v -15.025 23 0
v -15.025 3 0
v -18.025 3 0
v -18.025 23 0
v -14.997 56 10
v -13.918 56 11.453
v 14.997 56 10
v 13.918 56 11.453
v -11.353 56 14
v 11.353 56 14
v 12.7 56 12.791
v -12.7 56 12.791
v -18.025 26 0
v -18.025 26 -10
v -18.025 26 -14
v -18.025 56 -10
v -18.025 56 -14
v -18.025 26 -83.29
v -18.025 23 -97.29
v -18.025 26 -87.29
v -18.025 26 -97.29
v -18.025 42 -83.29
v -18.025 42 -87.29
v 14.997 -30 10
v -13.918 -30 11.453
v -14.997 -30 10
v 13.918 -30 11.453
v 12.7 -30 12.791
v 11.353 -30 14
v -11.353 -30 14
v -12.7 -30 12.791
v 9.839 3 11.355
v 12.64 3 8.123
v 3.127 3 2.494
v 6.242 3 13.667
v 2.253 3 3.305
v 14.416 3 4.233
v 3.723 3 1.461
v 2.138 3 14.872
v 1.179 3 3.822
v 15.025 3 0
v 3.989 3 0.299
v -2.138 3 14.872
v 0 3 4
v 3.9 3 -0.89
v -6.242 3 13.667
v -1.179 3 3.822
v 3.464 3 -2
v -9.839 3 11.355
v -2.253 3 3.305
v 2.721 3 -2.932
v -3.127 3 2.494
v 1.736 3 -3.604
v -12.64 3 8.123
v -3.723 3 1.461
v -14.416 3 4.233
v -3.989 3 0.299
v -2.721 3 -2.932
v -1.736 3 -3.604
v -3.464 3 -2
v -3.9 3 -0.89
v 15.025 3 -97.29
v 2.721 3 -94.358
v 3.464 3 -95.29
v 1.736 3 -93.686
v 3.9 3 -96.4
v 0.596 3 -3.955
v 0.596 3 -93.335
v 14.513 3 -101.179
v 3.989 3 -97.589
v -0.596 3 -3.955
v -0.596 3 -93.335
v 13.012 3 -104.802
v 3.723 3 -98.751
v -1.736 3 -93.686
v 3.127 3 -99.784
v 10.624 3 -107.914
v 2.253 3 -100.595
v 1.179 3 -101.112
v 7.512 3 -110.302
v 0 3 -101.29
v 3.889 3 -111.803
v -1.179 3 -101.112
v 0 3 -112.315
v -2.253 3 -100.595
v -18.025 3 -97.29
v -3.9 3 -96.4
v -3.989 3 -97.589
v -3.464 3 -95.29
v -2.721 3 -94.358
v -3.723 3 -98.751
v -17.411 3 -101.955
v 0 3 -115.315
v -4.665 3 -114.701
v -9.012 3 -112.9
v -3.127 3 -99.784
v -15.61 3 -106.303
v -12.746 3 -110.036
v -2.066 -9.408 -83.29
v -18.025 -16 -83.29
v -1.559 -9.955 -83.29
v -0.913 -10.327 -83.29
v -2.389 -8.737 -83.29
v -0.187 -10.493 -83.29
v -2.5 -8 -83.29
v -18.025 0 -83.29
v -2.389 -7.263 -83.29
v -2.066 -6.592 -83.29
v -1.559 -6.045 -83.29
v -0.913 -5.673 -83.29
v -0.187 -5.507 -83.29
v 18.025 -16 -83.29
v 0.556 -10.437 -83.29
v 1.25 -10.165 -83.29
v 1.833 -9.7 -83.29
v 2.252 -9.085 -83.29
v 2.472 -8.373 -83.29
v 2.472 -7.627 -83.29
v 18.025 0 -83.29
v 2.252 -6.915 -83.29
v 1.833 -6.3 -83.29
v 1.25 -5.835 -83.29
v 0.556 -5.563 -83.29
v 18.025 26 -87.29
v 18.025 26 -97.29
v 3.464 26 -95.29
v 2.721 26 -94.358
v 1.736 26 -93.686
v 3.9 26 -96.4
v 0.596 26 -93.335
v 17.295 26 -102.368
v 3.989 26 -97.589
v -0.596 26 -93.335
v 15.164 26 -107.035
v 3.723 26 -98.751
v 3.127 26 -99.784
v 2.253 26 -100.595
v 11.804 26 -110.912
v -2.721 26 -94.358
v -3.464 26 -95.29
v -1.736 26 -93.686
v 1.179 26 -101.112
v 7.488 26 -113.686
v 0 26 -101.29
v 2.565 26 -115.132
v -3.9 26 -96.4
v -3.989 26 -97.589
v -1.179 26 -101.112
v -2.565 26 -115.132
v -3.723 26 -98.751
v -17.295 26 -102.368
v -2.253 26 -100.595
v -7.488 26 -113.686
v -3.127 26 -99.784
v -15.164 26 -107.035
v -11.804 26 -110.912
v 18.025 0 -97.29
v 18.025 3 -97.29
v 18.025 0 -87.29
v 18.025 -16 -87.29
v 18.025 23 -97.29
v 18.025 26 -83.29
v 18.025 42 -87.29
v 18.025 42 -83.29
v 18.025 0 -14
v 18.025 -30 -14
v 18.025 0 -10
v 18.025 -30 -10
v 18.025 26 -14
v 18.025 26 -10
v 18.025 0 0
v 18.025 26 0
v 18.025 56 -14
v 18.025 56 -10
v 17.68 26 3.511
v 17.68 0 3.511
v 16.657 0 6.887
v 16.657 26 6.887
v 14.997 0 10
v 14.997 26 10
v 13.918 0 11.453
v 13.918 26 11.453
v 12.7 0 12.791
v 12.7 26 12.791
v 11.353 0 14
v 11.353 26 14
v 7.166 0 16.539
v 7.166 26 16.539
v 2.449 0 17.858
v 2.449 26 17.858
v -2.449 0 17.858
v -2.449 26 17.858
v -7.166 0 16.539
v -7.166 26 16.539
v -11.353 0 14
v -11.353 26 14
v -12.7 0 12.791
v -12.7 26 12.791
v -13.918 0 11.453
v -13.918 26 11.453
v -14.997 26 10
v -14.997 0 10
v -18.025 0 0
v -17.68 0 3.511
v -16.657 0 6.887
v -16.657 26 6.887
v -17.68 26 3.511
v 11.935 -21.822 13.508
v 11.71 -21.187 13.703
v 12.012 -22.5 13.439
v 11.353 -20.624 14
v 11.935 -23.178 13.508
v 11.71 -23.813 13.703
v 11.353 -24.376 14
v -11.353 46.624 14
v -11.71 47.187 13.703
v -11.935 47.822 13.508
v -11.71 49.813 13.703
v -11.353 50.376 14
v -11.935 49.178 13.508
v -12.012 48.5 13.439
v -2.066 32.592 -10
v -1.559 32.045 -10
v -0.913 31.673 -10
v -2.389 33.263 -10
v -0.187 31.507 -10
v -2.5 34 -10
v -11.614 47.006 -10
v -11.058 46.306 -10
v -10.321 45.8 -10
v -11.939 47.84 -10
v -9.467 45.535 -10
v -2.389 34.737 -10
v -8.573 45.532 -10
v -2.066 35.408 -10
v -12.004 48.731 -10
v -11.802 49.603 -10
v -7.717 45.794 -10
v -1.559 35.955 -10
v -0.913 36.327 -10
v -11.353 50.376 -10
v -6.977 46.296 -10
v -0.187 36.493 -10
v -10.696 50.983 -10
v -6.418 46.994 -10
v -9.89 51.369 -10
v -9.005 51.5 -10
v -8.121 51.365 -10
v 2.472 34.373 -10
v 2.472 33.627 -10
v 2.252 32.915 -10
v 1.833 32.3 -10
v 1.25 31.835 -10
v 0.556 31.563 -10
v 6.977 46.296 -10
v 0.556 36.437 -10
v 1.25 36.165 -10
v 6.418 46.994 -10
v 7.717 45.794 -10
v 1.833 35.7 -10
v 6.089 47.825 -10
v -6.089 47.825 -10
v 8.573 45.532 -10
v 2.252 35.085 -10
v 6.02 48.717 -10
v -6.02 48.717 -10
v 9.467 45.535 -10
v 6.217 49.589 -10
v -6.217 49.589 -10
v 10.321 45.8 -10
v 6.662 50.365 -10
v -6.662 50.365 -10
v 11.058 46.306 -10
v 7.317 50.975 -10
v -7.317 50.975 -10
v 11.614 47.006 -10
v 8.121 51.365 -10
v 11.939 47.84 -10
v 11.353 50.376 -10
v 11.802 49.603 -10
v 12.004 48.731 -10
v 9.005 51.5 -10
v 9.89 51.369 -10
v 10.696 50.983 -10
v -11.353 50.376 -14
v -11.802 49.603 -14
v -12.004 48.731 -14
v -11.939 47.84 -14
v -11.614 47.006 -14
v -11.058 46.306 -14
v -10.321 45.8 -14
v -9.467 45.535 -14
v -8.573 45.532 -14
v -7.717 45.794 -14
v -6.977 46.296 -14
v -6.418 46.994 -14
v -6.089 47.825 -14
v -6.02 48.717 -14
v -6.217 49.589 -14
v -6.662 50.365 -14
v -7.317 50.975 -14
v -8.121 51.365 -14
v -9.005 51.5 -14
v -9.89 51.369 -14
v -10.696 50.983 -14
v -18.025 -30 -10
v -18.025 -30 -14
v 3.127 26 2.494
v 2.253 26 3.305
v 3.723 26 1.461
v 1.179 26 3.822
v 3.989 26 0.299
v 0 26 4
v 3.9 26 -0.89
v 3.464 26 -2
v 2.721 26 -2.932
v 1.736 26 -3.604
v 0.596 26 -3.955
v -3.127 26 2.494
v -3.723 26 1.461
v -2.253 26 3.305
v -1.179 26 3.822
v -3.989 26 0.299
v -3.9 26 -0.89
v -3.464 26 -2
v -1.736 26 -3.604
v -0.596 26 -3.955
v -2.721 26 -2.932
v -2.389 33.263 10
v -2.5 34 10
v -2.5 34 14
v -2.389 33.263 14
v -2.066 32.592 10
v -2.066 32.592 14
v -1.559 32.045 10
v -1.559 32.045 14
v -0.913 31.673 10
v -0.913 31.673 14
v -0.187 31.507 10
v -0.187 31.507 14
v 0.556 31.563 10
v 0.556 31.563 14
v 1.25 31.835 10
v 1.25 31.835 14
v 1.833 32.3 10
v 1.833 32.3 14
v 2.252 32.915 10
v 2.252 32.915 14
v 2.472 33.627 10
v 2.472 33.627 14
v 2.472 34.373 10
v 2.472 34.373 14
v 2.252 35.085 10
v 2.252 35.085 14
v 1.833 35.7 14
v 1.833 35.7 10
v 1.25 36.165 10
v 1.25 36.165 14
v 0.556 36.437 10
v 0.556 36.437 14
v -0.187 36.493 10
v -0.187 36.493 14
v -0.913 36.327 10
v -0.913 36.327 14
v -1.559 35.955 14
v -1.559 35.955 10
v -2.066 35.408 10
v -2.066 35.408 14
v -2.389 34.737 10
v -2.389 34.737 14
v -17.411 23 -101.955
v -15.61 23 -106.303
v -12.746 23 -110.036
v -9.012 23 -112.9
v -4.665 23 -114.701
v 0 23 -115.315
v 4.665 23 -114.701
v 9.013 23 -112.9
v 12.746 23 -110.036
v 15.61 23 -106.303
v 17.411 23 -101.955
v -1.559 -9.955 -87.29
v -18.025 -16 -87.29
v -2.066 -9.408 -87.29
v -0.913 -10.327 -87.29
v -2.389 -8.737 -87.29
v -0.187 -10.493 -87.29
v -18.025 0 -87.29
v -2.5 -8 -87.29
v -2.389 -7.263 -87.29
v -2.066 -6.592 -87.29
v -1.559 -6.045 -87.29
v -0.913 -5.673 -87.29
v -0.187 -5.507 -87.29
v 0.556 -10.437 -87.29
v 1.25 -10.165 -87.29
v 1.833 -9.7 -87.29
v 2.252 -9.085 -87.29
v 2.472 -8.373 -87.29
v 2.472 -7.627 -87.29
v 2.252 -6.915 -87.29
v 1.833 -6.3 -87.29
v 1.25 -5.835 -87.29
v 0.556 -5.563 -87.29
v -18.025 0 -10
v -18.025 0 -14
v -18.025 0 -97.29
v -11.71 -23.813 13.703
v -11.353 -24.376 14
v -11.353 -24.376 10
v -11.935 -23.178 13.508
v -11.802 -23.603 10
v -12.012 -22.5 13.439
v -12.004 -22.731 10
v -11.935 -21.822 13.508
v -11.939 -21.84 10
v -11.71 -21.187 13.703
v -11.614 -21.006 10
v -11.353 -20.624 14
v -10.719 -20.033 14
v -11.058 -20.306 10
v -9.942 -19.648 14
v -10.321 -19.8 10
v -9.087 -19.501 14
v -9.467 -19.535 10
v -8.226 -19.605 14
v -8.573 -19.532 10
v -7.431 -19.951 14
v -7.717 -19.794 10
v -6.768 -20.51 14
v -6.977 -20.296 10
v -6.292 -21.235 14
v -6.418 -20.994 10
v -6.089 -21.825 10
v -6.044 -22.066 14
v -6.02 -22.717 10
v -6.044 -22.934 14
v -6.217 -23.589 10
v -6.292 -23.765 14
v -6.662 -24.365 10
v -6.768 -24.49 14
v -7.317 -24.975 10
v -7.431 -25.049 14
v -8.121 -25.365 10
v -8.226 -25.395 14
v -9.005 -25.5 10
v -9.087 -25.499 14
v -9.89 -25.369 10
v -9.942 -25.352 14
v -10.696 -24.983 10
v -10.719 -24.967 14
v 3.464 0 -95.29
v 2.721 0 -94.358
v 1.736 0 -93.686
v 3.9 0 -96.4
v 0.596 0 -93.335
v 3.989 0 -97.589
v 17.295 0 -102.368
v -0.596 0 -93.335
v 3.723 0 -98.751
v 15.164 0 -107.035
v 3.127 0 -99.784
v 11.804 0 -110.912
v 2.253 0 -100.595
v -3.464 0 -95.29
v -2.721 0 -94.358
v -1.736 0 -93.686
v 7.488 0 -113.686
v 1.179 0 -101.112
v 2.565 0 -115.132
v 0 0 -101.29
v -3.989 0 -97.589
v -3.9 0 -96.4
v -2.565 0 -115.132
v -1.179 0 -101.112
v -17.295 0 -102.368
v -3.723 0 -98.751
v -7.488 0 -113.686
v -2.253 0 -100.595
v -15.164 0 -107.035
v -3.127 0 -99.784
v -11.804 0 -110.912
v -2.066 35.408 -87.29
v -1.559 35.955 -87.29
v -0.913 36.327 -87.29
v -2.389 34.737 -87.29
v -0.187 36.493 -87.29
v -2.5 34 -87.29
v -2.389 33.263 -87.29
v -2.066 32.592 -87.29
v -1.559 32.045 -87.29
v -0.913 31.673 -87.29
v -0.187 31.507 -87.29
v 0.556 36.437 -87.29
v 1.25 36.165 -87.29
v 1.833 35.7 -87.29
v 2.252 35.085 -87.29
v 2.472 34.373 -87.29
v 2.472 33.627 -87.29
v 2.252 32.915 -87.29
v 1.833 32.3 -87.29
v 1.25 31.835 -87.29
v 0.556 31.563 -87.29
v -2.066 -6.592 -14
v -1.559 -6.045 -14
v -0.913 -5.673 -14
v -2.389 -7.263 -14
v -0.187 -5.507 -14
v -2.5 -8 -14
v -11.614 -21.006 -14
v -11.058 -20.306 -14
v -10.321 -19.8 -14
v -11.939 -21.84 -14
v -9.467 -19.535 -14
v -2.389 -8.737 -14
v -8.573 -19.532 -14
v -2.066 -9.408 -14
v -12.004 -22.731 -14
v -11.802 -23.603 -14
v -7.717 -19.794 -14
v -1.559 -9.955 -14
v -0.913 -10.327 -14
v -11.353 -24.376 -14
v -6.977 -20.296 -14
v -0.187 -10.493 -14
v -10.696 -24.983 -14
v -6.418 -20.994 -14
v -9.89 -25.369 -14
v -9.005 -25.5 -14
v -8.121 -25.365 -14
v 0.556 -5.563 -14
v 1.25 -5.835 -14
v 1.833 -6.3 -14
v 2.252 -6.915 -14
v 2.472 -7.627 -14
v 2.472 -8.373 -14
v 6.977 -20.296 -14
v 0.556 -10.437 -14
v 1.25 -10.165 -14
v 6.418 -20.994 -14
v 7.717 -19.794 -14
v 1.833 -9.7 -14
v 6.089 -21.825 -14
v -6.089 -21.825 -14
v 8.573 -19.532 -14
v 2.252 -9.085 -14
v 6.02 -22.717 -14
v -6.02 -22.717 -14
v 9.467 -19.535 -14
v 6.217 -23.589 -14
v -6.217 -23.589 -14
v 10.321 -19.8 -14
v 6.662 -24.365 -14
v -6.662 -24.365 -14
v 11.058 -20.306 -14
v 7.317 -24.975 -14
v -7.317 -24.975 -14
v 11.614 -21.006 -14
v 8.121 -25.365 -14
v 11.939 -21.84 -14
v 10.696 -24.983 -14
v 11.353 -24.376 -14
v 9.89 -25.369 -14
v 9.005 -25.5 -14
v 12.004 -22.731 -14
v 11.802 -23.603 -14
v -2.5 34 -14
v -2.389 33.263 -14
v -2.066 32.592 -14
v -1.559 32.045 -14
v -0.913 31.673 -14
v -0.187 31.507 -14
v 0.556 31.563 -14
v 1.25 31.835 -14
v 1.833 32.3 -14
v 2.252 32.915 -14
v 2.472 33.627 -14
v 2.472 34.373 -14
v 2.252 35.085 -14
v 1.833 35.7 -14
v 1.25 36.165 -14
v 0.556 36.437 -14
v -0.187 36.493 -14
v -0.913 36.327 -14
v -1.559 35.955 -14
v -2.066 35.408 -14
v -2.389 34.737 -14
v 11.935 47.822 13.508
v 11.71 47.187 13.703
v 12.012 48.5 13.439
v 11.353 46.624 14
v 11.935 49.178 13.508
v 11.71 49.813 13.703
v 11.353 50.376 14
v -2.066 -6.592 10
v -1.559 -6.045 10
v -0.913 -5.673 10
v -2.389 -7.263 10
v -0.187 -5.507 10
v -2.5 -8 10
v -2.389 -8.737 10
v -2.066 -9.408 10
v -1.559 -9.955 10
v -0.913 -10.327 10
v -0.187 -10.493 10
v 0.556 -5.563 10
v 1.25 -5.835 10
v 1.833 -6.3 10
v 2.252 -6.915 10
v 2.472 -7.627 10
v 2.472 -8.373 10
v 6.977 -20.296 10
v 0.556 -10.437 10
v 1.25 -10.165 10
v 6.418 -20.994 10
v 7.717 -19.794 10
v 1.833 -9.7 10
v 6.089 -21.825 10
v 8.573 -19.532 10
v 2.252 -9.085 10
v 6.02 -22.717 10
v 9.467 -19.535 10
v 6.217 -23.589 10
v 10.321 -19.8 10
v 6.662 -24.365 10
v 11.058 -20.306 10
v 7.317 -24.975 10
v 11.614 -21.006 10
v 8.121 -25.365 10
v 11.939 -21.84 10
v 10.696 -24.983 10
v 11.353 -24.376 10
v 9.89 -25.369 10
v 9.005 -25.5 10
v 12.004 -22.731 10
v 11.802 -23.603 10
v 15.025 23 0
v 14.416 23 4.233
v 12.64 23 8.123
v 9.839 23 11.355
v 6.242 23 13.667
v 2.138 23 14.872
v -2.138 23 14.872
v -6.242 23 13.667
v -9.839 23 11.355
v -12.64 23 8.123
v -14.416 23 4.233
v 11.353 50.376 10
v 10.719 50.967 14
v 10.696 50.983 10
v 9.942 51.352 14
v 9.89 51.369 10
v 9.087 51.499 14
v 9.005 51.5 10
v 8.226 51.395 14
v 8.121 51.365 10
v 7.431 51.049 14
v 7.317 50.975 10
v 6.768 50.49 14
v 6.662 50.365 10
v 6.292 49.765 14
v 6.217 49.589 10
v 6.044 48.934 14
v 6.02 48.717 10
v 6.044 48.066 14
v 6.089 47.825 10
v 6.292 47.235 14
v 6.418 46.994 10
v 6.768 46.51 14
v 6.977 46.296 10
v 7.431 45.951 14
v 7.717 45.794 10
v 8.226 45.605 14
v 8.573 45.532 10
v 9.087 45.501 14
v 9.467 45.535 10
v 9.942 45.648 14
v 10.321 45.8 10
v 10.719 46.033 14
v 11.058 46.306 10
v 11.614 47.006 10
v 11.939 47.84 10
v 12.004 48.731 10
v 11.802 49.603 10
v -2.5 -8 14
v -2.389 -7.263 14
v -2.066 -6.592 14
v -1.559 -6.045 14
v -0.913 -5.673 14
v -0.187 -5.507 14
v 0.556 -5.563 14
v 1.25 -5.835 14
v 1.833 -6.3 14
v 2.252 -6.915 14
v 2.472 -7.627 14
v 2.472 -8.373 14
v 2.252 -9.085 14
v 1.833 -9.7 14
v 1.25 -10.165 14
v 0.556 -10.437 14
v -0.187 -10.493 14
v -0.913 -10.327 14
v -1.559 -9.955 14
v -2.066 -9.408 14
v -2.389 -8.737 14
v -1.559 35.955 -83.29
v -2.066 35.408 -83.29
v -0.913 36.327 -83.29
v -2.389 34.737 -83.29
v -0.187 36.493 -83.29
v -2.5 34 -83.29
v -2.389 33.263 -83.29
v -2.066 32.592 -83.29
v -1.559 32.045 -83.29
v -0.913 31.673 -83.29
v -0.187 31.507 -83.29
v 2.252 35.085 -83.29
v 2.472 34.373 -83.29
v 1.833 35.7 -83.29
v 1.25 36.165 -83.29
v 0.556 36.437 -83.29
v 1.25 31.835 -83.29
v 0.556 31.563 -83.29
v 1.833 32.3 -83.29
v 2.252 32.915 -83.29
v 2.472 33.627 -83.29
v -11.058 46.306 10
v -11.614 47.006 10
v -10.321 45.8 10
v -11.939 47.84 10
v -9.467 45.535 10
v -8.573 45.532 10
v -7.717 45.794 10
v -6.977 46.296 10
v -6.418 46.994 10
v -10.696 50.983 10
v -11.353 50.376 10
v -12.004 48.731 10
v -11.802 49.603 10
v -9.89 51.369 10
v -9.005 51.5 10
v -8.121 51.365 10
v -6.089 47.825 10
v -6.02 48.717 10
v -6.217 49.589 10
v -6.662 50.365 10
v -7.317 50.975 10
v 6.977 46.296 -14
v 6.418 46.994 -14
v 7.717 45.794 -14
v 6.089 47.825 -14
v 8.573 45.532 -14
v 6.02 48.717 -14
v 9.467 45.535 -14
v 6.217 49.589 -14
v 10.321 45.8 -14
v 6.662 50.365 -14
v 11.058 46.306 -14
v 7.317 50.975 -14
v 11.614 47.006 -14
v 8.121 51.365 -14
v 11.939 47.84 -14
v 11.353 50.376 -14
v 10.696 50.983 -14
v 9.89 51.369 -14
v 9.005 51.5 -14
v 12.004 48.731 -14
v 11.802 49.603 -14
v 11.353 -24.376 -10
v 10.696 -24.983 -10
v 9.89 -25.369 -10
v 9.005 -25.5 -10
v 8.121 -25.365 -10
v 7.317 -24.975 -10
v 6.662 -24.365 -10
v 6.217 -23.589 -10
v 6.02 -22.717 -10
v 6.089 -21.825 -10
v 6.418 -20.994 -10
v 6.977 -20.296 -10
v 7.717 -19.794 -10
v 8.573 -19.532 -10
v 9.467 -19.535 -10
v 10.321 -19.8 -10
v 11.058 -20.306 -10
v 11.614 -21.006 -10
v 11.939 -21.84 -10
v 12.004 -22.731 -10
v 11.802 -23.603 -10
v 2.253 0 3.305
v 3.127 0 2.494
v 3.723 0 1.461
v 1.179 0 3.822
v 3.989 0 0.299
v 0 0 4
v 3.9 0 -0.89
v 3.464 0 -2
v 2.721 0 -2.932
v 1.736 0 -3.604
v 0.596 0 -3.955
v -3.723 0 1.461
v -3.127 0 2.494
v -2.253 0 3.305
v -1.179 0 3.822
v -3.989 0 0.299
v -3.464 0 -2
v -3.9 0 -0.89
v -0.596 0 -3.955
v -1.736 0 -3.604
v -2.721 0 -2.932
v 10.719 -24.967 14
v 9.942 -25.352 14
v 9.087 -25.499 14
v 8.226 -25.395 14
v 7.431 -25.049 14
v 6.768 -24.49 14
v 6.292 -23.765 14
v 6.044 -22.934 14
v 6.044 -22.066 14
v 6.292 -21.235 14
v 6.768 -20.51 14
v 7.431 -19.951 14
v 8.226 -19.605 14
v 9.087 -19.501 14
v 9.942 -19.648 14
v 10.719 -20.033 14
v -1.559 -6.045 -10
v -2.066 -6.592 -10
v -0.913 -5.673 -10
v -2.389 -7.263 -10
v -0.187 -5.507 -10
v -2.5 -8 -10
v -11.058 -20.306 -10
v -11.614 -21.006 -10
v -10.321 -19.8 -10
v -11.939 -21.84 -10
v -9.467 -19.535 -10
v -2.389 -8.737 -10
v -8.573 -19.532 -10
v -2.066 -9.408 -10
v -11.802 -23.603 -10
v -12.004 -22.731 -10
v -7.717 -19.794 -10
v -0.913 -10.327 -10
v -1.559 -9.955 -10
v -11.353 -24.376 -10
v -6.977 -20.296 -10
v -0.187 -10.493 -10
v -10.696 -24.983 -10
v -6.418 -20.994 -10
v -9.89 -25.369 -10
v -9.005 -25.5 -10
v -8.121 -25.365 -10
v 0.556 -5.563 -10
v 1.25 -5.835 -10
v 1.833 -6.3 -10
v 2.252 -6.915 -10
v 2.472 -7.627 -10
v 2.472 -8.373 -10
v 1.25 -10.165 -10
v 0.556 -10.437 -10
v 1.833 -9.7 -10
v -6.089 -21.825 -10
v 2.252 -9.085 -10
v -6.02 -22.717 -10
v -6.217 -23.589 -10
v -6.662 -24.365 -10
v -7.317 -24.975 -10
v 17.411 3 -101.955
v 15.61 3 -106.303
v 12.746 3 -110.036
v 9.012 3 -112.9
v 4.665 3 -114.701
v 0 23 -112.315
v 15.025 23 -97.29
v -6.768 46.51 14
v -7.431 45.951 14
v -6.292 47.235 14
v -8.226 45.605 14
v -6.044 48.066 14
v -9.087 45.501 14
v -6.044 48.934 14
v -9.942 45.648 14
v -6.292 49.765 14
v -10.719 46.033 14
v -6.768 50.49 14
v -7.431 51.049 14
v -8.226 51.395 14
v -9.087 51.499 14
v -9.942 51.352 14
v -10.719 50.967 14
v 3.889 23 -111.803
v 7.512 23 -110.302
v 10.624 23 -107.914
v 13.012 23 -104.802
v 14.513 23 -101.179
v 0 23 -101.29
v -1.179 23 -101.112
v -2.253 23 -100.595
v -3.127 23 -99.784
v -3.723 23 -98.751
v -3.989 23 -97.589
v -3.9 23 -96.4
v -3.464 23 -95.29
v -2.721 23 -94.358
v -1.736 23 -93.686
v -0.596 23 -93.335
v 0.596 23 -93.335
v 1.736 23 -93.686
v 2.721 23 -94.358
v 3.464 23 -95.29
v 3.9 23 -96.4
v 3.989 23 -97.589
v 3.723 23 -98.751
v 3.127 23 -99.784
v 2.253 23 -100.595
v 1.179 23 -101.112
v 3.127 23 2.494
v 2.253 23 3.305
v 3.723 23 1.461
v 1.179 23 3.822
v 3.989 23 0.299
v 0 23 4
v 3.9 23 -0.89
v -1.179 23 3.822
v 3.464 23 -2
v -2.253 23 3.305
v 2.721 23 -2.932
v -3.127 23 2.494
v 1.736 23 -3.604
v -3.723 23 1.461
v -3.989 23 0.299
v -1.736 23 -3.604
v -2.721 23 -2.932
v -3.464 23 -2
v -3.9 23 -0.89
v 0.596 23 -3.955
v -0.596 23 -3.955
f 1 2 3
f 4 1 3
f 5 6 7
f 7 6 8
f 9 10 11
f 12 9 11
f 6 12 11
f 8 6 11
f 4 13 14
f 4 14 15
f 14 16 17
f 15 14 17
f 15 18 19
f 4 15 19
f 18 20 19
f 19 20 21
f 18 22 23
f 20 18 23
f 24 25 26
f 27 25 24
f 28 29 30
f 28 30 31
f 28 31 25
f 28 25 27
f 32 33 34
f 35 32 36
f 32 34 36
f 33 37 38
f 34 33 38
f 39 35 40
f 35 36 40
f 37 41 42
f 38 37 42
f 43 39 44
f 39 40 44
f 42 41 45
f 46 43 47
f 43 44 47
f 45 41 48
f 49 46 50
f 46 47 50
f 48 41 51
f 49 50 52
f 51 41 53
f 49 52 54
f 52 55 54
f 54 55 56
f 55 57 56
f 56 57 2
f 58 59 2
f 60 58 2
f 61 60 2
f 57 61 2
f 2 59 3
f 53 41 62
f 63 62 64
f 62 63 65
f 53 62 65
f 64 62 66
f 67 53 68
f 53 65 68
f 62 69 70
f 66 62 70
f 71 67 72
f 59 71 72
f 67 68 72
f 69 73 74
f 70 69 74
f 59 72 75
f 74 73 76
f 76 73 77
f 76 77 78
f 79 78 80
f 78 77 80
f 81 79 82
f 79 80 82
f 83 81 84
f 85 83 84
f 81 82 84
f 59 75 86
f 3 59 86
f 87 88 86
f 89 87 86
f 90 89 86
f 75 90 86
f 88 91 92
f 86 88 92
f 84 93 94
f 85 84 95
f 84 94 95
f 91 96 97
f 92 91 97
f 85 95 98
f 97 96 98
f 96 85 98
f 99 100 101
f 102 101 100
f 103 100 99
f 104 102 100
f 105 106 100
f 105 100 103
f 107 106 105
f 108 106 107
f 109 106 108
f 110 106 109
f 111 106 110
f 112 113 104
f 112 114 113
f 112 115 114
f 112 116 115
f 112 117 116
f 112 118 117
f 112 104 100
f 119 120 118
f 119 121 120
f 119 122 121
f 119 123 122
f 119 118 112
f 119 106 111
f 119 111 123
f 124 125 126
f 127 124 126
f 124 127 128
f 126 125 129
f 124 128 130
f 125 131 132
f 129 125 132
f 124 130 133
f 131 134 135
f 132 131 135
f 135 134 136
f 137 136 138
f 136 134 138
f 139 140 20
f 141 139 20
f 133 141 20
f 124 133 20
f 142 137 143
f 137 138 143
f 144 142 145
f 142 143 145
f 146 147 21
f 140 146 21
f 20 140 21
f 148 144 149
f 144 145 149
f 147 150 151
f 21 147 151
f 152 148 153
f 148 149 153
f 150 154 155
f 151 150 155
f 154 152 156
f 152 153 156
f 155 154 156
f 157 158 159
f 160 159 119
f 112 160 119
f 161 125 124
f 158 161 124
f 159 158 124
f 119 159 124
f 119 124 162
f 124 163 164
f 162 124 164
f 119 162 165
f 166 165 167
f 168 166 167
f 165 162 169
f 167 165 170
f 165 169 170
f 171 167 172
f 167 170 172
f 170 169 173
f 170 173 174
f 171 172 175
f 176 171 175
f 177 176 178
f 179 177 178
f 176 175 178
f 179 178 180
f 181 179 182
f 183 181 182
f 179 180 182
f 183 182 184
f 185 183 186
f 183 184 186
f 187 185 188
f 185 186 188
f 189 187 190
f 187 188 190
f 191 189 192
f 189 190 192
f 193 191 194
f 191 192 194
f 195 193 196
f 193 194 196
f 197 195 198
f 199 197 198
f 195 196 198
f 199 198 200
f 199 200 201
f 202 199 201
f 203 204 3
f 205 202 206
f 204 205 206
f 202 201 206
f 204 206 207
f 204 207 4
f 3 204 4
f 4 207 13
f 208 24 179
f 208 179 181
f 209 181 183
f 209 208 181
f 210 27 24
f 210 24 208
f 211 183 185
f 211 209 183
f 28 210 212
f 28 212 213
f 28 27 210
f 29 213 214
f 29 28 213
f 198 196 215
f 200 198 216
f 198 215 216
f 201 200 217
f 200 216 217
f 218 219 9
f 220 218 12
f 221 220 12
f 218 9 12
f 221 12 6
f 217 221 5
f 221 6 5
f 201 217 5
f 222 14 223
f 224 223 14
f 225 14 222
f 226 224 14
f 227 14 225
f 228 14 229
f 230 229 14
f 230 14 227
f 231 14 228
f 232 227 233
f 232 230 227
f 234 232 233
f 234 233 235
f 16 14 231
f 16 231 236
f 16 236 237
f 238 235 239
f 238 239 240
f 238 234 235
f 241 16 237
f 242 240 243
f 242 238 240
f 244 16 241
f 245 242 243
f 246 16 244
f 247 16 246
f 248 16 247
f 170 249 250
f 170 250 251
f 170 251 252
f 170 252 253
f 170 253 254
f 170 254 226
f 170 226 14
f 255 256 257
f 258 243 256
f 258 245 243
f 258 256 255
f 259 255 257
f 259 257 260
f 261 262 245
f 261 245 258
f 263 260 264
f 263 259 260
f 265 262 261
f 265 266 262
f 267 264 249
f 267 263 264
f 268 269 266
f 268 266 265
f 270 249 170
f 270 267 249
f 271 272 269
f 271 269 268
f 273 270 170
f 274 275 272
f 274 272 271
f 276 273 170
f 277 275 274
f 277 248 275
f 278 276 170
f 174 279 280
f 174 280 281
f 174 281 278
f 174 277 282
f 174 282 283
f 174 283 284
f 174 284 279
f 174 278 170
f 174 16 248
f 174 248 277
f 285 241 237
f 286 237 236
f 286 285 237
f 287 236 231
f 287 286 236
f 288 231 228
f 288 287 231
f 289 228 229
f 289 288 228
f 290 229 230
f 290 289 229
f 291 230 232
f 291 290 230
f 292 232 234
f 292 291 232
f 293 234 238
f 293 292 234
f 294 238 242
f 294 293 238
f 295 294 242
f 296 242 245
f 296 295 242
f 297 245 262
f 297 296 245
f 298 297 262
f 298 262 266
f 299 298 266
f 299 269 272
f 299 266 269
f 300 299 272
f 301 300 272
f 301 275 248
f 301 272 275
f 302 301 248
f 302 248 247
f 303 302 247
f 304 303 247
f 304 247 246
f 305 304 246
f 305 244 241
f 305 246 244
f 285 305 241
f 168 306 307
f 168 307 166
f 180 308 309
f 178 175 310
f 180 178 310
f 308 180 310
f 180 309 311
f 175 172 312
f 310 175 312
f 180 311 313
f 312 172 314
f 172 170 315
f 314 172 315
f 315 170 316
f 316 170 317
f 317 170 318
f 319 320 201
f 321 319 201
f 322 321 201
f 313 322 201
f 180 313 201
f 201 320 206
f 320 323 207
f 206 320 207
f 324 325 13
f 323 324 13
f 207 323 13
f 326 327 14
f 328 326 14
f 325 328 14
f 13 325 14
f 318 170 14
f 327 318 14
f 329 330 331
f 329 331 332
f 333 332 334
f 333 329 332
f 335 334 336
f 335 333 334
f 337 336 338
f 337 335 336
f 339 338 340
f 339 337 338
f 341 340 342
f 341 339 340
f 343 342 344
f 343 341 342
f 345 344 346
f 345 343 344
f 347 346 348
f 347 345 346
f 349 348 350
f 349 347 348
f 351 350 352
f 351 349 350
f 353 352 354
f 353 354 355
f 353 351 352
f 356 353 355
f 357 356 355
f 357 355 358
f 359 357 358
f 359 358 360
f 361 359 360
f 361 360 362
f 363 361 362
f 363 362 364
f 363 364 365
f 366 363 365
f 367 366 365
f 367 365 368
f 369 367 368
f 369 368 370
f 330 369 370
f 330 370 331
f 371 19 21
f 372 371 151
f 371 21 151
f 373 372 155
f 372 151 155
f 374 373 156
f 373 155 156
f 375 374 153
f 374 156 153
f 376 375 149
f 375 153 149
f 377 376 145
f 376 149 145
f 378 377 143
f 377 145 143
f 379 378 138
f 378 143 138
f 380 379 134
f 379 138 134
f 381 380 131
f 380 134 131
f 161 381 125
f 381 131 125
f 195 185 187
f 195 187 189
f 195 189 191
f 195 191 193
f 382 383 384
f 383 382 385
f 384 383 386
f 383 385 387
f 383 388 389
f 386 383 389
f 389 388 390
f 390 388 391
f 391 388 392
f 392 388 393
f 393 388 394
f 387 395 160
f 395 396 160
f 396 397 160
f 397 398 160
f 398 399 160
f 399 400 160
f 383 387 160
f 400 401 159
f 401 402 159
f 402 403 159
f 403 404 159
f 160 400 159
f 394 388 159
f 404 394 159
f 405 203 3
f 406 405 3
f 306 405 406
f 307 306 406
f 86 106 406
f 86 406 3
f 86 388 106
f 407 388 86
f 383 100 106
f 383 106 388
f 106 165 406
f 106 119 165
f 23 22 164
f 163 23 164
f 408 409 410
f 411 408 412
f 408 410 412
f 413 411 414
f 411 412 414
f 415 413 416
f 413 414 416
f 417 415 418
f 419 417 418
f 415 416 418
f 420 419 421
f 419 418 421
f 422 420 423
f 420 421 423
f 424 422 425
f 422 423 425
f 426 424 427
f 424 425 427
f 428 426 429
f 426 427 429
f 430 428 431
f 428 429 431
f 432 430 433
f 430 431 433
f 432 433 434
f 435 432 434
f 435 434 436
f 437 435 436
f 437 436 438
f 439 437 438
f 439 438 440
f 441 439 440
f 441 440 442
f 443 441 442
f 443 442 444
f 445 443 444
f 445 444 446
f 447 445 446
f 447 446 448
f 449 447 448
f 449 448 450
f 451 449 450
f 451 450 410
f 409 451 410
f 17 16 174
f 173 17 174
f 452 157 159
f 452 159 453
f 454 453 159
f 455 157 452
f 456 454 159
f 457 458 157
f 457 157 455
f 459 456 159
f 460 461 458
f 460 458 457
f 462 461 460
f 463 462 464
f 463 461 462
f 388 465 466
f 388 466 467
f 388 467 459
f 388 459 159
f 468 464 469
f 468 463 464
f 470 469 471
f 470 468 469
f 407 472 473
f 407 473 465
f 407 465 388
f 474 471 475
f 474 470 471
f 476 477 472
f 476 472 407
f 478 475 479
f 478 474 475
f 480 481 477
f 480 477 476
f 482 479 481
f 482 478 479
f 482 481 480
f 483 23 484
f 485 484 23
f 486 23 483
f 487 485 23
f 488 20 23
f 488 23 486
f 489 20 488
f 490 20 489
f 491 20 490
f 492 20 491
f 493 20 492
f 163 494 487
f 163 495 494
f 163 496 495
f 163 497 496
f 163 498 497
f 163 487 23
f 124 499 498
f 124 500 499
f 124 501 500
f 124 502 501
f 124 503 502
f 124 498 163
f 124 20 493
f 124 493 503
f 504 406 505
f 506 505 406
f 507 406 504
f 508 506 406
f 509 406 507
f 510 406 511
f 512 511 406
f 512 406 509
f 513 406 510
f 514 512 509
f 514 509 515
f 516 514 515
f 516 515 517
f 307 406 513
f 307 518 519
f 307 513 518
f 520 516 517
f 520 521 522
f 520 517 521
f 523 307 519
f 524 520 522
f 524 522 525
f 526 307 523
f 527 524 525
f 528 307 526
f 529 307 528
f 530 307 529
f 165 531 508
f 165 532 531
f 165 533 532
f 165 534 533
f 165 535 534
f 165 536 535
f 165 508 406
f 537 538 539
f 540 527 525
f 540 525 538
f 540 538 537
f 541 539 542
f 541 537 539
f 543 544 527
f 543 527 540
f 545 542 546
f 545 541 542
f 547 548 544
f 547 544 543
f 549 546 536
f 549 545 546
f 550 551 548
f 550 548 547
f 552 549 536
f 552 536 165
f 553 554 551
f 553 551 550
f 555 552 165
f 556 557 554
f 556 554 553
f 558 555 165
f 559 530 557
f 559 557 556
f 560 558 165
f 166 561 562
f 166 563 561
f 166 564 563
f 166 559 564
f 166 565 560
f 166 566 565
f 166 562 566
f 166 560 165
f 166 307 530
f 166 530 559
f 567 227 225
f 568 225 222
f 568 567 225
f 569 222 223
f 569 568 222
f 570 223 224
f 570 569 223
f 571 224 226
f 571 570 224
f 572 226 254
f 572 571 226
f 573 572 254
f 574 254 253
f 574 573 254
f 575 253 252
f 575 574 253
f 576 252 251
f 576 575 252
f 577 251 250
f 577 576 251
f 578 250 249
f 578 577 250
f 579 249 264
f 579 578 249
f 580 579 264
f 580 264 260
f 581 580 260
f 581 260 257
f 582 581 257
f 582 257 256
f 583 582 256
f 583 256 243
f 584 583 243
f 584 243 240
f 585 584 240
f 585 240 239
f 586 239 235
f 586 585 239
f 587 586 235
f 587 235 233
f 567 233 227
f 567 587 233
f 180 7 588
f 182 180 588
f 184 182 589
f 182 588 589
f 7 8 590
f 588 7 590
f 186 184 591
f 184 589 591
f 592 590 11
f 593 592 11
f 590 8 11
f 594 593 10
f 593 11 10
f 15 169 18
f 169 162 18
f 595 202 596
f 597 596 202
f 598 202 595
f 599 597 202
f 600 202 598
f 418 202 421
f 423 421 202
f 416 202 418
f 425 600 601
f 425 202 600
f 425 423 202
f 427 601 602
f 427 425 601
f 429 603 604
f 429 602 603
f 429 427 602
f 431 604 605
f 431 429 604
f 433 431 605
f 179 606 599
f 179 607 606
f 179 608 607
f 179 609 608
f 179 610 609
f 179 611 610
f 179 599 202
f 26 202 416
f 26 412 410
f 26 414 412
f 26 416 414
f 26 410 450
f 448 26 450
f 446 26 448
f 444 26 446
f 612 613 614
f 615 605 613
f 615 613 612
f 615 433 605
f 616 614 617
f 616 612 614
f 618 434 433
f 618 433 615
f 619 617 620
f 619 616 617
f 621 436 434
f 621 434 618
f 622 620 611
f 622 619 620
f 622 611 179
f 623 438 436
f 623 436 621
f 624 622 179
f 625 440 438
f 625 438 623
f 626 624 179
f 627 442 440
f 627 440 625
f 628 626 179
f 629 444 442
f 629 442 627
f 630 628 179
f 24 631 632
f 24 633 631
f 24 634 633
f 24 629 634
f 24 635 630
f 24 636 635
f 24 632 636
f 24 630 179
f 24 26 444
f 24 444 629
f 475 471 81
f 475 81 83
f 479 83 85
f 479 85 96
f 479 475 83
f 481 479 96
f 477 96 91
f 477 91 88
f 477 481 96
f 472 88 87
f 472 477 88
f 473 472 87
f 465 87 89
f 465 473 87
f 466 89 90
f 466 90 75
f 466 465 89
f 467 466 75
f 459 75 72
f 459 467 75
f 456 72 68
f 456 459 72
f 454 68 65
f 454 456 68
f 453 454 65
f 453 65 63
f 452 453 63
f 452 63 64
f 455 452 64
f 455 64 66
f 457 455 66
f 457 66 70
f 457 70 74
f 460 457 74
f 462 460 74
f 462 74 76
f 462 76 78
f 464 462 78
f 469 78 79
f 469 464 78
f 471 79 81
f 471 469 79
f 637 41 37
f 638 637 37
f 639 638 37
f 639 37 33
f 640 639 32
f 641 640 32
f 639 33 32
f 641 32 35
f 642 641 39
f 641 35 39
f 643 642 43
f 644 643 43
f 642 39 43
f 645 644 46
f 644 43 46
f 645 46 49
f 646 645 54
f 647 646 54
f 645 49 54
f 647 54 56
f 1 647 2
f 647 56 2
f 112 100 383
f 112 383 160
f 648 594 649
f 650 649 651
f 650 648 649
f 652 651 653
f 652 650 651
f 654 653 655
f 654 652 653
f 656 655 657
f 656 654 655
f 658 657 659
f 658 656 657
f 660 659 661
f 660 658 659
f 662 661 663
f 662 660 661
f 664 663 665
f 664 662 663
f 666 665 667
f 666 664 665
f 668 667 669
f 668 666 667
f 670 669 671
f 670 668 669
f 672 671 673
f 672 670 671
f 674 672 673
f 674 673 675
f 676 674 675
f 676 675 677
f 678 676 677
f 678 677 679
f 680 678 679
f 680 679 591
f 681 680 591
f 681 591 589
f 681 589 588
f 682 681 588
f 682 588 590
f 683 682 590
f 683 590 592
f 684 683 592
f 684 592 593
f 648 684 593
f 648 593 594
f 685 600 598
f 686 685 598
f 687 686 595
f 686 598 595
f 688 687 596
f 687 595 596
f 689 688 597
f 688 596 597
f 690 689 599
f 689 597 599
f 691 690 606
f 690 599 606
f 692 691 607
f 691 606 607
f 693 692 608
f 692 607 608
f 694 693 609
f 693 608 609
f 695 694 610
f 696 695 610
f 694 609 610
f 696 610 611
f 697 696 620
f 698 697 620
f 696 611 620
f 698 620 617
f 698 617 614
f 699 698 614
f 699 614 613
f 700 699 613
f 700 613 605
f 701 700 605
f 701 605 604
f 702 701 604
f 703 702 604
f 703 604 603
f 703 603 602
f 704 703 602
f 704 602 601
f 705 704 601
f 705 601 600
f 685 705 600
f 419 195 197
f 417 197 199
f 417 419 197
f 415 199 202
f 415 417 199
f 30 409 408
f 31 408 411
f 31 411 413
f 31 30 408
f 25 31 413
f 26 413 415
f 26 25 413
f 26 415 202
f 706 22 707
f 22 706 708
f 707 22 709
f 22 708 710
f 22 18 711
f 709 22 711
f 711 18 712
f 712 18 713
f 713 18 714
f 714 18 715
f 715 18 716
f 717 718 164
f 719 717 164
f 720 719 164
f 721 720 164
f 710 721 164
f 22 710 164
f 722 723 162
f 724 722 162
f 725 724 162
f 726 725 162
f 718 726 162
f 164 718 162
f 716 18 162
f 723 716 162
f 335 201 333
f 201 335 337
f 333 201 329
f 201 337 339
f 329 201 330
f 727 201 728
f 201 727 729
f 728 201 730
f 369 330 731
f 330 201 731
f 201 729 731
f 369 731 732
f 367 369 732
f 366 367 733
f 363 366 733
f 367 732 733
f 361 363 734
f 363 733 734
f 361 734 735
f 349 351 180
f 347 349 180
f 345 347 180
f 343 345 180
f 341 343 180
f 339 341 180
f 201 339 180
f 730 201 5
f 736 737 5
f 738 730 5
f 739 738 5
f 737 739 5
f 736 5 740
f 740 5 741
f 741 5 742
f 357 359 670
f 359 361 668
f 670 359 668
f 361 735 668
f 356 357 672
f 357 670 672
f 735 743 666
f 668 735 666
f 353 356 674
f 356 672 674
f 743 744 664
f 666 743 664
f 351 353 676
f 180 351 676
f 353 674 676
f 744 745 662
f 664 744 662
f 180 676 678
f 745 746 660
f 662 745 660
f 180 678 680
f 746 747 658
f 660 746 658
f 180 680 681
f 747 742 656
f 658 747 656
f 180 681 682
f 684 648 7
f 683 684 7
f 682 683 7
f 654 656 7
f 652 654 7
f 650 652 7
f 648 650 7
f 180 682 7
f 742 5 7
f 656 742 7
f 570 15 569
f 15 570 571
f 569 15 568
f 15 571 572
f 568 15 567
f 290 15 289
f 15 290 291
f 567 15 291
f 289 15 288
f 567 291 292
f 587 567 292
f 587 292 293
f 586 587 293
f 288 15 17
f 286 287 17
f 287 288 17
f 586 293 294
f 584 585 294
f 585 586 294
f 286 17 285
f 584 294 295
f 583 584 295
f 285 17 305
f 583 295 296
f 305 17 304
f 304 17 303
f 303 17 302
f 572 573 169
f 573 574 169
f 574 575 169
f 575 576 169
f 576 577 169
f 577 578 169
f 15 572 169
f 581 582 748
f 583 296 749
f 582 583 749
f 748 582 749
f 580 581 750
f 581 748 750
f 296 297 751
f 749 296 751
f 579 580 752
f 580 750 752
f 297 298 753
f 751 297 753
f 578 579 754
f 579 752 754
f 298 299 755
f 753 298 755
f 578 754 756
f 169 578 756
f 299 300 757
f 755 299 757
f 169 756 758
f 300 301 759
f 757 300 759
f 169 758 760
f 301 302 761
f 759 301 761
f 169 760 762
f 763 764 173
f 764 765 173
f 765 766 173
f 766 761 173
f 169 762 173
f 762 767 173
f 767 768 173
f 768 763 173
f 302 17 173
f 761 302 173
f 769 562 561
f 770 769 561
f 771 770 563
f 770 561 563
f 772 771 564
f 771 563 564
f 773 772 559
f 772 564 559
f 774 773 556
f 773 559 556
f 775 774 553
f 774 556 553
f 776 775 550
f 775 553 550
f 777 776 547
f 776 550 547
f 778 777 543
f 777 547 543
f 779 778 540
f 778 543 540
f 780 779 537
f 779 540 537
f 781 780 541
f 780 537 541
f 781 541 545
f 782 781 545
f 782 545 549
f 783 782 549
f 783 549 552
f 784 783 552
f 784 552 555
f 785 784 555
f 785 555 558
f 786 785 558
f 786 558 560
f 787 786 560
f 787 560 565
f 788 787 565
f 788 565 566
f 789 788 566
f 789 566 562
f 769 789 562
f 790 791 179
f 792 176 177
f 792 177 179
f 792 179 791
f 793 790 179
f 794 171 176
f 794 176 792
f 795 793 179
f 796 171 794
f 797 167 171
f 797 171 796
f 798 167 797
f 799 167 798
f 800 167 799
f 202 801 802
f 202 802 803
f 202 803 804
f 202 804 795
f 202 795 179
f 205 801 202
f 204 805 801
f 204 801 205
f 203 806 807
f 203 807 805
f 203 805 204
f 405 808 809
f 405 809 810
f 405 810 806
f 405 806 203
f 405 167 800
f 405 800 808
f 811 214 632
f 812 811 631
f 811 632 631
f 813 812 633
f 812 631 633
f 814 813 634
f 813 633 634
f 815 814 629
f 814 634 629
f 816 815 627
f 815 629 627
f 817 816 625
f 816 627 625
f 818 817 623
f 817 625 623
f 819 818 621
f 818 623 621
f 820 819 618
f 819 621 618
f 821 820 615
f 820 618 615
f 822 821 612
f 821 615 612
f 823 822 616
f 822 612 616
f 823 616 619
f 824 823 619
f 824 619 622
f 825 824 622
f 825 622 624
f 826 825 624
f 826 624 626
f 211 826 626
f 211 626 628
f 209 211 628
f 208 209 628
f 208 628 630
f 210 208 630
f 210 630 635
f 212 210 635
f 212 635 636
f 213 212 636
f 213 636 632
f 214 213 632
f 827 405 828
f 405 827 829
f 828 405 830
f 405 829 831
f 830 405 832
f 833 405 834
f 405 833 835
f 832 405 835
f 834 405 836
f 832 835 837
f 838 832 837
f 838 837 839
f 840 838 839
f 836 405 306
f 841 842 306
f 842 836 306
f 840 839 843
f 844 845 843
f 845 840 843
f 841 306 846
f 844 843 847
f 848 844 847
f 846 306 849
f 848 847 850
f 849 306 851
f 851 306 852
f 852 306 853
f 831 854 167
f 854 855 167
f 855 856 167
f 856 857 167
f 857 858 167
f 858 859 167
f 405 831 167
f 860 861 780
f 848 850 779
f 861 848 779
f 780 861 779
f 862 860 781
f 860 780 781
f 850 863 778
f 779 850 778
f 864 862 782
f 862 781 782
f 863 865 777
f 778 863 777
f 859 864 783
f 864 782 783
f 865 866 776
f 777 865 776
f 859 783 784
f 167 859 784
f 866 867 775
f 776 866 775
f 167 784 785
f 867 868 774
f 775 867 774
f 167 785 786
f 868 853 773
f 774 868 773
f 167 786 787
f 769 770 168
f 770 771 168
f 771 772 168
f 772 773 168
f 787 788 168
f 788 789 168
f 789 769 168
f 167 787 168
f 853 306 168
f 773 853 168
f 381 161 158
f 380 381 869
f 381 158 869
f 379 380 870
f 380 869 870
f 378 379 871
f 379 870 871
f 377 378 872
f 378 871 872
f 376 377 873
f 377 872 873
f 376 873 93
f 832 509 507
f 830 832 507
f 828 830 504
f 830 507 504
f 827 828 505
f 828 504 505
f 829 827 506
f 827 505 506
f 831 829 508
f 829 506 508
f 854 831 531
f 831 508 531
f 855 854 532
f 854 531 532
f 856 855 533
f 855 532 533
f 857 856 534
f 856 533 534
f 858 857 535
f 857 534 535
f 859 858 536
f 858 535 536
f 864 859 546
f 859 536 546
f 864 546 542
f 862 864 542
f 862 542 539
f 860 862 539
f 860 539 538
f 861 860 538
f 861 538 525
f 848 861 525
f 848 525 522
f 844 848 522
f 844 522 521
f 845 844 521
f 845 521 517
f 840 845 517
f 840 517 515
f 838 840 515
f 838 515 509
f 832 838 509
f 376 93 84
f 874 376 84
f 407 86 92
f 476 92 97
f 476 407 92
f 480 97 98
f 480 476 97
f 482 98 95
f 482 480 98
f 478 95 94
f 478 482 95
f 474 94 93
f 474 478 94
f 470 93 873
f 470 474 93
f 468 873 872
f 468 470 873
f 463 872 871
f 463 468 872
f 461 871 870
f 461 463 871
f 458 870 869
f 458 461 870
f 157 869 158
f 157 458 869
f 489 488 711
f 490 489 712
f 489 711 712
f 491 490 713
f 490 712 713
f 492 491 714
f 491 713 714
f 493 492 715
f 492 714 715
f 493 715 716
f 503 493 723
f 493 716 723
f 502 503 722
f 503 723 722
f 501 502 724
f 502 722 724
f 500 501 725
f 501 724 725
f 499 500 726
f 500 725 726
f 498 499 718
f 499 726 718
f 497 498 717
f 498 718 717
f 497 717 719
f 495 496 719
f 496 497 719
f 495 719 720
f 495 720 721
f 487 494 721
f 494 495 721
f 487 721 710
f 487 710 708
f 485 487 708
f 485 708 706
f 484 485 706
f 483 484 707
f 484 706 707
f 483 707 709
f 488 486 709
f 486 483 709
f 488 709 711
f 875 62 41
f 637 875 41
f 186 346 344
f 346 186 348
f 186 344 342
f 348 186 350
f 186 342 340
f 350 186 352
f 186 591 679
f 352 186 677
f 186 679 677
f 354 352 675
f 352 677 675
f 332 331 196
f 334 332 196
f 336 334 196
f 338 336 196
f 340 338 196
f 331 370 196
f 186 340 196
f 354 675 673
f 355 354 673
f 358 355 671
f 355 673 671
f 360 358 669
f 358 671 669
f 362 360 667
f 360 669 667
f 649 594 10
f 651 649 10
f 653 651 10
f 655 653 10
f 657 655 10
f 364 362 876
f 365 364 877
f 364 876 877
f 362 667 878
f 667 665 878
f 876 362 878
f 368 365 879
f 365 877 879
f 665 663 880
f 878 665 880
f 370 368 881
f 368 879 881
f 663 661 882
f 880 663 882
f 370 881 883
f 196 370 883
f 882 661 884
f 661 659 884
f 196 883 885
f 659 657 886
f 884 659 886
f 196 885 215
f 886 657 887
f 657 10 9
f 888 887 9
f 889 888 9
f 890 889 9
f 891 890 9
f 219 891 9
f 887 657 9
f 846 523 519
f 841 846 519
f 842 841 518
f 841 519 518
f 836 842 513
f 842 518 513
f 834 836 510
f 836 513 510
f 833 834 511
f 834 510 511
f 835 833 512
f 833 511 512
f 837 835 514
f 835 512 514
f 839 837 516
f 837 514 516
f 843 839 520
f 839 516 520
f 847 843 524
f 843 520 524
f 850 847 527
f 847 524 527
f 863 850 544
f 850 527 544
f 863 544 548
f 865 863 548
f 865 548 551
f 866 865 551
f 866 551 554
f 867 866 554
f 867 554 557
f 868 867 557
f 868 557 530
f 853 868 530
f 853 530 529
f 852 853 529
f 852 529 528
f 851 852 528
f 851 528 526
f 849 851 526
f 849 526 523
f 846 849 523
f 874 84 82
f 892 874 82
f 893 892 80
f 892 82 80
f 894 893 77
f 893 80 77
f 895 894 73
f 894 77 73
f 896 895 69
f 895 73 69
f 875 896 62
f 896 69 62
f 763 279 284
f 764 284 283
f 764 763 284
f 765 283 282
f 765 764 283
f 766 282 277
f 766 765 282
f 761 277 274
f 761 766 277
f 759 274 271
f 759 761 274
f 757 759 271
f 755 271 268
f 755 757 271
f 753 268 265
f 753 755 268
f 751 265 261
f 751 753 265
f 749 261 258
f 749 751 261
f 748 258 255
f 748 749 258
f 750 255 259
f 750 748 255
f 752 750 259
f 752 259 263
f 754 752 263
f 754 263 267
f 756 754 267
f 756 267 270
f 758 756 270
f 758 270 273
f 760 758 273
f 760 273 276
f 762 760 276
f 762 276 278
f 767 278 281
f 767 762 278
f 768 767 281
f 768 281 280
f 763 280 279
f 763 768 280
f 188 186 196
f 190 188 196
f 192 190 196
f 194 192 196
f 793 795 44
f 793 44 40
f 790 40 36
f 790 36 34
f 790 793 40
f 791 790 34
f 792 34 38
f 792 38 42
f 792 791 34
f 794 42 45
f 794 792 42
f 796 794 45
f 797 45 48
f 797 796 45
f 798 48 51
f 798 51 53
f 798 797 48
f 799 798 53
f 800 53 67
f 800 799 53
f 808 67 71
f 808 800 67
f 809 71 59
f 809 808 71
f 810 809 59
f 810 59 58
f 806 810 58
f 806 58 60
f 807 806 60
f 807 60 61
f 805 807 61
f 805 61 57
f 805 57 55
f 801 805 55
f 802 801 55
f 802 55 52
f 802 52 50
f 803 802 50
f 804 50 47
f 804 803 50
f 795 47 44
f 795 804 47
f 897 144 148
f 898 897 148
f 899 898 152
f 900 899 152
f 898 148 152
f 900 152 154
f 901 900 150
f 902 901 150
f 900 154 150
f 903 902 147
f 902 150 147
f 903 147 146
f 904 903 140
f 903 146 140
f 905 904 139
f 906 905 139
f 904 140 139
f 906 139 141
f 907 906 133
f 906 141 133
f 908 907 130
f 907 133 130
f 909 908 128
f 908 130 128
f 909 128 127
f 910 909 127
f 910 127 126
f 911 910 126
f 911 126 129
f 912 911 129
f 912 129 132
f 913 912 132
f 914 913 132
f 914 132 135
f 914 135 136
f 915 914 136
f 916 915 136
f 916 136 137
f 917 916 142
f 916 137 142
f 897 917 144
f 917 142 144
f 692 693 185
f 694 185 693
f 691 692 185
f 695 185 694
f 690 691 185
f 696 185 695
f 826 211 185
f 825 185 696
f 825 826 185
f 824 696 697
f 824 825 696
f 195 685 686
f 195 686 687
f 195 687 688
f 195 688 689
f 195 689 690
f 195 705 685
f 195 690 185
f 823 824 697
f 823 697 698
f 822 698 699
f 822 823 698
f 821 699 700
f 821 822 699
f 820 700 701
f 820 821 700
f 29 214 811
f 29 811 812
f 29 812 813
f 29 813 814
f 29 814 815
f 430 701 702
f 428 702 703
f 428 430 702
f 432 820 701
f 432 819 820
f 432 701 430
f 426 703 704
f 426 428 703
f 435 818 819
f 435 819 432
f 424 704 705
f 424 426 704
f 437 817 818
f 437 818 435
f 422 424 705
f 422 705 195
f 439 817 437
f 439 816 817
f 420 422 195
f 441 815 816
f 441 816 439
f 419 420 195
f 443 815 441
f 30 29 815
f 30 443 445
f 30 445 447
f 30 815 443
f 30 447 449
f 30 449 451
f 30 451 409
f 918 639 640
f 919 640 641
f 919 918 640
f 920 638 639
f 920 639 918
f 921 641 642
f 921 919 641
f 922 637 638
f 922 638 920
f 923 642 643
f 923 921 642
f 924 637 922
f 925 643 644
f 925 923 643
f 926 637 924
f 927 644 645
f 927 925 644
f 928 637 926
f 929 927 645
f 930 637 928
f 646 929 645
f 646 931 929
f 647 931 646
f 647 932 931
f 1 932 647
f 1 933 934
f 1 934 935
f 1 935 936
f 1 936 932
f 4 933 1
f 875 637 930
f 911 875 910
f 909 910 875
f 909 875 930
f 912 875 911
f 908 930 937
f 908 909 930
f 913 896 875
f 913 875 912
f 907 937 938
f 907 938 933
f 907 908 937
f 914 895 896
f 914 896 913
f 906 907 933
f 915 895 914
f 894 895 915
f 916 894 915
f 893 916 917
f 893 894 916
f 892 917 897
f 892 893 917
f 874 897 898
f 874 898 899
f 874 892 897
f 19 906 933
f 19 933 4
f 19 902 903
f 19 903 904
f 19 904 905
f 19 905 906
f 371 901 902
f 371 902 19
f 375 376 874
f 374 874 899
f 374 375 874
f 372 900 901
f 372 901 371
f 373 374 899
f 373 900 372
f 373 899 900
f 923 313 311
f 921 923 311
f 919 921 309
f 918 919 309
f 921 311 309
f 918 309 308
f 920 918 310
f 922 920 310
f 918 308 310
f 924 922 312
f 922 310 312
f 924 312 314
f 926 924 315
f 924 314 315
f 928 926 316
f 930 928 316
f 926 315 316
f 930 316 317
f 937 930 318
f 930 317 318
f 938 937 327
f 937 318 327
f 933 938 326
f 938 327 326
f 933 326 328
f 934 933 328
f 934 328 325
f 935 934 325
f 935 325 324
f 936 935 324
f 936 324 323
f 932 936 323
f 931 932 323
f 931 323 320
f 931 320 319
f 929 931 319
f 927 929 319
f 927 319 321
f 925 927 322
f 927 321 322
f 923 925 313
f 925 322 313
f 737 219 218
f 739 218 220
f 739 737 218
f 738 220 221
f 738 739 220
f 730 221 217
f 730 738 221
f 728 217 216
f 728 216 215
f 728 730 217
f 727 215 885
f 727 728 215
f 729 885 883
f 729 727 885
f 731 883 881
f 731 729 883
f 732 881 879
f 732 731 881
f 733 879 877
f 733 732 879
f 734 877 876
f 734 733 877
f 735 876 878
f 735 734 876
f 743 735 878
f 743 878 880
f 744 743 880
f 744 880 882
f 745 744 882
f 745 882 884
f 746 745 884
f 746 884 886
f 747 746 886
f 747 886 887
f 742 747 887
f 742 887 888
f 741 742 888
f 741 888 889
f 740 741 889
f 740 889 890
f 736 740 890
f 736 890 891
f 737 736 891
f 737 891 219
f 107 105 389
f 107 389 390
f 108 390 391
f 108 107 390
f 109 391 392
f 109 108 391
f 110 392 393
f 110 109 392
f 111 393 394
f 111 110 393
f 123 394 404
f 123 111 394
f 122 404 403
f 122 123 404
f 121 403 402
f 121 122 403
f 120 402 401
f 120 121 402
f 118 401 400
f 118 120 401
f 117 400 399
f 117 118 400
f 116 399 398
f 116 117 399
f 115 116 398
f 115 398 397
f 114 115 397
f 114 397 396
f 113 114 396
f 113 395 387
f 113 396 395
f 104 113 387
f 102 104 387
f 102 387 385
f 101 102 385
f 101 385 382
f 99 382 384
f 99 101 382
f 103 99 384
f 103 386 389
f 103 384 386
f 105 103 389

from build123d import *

# Parameters (mm, degrees)
SKETCH1_R                      = 4
BOSS_EXTRUDE1_DEPTH            = 3
BOSS_EXTRUDE3_DEPTH            = 20
BOSS_EXTRUDE4_START            = 30
SKETCH4_W                      = 36.05
SKETCH4_H                      = 4
BOSS_EXTRUDE4_DEPTH            = 30
SKETCH6_W                      = 36.05
SKETCH6_H                      = 4
BOSS_EXTRUDE5_DEPTH            = 16
CUT_EXTRUDE2_REACH             = 109.19
SKETCH5_R                      = 2.5
SKETCH5_R_2                    = 3
CUT_EXTRUDE2_DIRECTION_2_REACH = 109.19


with BuildPart() as part:
    # Sketch1 → Boss-Extrude1 (new body)
    with BuildSketch(Plane(origin=(0, 0, 0), x_dir=(1, 0, 0), z_dir=(0, 1, 0))):
        with BuildLine():
            Line((-18.025, 0), (-18.025, 97.29))
            ThreePointArc((-18.025, 97.29), (0, 115.315), (18.025, 97.29))
            Line((18.025, 97.29), (18.025, 0))
            ThreePointArc((18.025, 0), (0, -18.025), (-18.025, 0))
        make_face()
        with Locations(Location((0, 0, 0), (0, 0, 270))):
            Circle(SKETCH1_R, mode=Mode.SUBTRACT)
        with Locations(Location((0, 97.29, 0), (0, 0, 90))):
            Circle(SKETCH1_R, mode=Mode.SUBTRACT)
    boss_extrude1 = extrude(amount=BOSS_EXTRUDE1_DEPTH)

    # Sketch3 → Boss-Extrude3 (add)
    with BuildSketch(Plane(origin=(0, 3, 0), x_dir=(1, 0, 0), z_dir=(0, 1, 0))):
        with BuildLine():
            Line((-15.025, 0), (-18.025, 0))
            ThreePointArc((-18.025, 0), (0, -18.025), (18.025, 0))
            Line((18.025, 0), (18.025, 97.29))
            ThreePointArc((18.025, 97.29), (12.745599731, 110.035599731), (0, 115.315))
            Line((0, 115.315), (0, 112.315))
            ThreePointArc((0, 112.315), (10.624279387, 107.914279387), (15.025, 97.29))
            Line((15.025, 97.29), (15.025, 0))
            ThreePointArc((15.025, 0), (0, -15.025), (-15.025, 0))
        make_face()
    extrude(amount=BOSS_EXTRUDE3_DEPTH)

    # Mirror1: Boss-Extrude1 across plane
    add(boss_extrude1.mirror(Plane.ZX.offset(13)))

    # Sketch4 → Boss-Extrude4 (add)
    with BuildSketch(Plane.XZ.offset(BOSS_EXTRUDE4_START)):
        with Locations((0, -12)):
            Rectangle(SKETCH4_W, SKETCH4_H)
        with BuildLine():
            Line((-14.996687134, 10), (14.996687134, 10))
            ThreePointArc((14.996687134, 10), (13.326001448, 12.137475454), (11.353441108, 14))
            Line((11.353441108, 14), (-11.353441108, 14))
            ThreePointArc((-11.353441108, 14), (-13.326001448, 12.137475454), (-14.996687134, 10))
        make_face()
    boss_extrude4 = extrude(amount=-BOSS_EXTRUDE4_DEPTH)

    # Sketch6 → Boss-Extrude5 (add)
    with BuildSketch(Plane.XZ):
        with Locations((0, -12)):
            Rectangle(SKETCH6_W, SKETCH6_H)
        with Locations((0, -85.29)):
            Rectangle(SKETCH6_W, SKETCH6_H)
    boss_extrude5 = extrude(amount=BOSS_EXTRUDE5_DEPTH)

    # Cut-Extrude2: up to this face of the body (flat: up to its plane)
    cut_extrude2_end = Plane(part.part.faces().sort_by_distance((0, -15, 14))[0])
    # Sketch5 → Cut-Extrude2 (cut, up to the picked face)
    with BuildSketch(Plane(origin=(0, 0, -14), x_dir=(-1, 0, 0), z_dir=(0, 0, -1)), mode=Mode.PRIVATE) as cut_extrude2_sk1:
        with Locations((0, -8)):
            Circle(SKETCH5_R)
    cut_extrude2_tool1 = split(extrude(cut_extrude2_sk1.sketch, amount=-CUT_EXTRUDE2_REACH, mode=Mode.PRIVATE), bisect_by=cut_extrude2_end, keep=Keep.BOTH, mode=Mode.PRIVATE)
    # Sketch5 → Cut-Extrude2 (cut, up to the picked face)
    with BuildSketch(Plane(origin=(0, 0, -14), x_dir=(-1, 0, 0), z_dir=(0, 0, -1)), mode=Mode.PRIVATE) as cut_extrude2_sk2:
        with Locations(Location((-9.0125, -22.5, 0), (0, 0, 218.710740726))):
            Circle(SKETCH5_R_2)
    cut_extrude2_tool2 = split(extrude(cut_extrude2_sk2.sketch, amount=-CUT_EXTRUDE2_REACH, mode=Mode.PRIVATE), bisect_by=cut_extrude2_end, keep=Keep.BOTH, mode=Mode.PRIVATE)
    # Sketch5 → Cut-Extrude2 (cut, up to the picked face)
    with BuildSketch(Plane(origin=(0, 0, -14), x_dir=(-1, 0, 0), z_dir=(0, 0, -1)), mode=Mode.PRIVATE) as cut_extrude2_sk3:
        with Locations(Location((9.0125, -22.5, 0), (0, 0, 321.289306711))):
            Circle(SKETCH5_R_2)
    cut_extrude2_tool3 = split(extrude(cut_extrude2_sk3.sketch, amount=-CUT_EXTRUDE2_REACH, mode=Mode.PRIVATE), bisect_by=cut_extrude2_end, keep=Keep.BOTH, mode=Mode.PRIVATE)
    cut_extrude2_1 = cut_extrude2_tool1.solids().sort_by(Axis((0, -8, -14), (0, 0, 1)))[0]
    add(cut_extrude2_1, mode=Mode.SUBTRACT)
    cut_extrude2_2 = cut_extrude2_tool2.solids().sort_by(Axis((9.0125, -22.5, -14), (0, 0, 1)))[0]
    add(cut_extrude2_2, mode=Mode.SUBTRACT)
    cut_extrude2_3 = cut_extrude2_tool3.solids().sort_by(Axis((-9.0125, -22.5, -14), (0, 0, 1)))[0]
    add(cut_extrude2_3, mode=Mode.SUBTRACT)
    cut_extrude2 = cut_extrude2_1 + cut_extrude2_2 + cut_extrude2_3  # Cut-Extrude2 as one shape, for the pattern or mirror that repeats it

    # Cut-Extrude2 direction 2: up to this face of the body (flat: up to its plane)
    cut_extrude2_direction_2_end = Plane(part.part.faces().sort_by_distance((0, -8, -87.29))[0])
    # Sketch5 → Cut-Extrude2 direction 2 (cut, up to the picked face)
    with BuildSketch(Plane(origin=(0, 0, -14), x_dir=(-1, 0, 0), z_dir=(0, 0, -1)), mode=Mode.PRIVATE) as cut_extrude2_direction_2_sk1:
        with Locations((0, -8)):
            Circle(SKETCH5_R)
    cut_extrude2_direction_2_tool1 = split(extrude(cut_extrude2_direction_2_sk1.sketch, amount=CUT_EXTRUDE2_DIRECTION_2_REACH, mode=Mode.PRIVATE), bisect_by=cut_extrude2_direction_2_end, keep=Keep.BOTH, mode=Mode.PRIVATE)
    # Sketch5 → Cut-Extrude2 direction 2 (cut, up to the picked face)
    with BuildSketch(Plane(origin=(0, 0, -14), x_dir=(-1, 0, 0), z_dir=(0, 0, -1)), mode=Mode.PRIVATE) as cut_extrude2_direction_2_sk2:
        with Locations(Location((-9.0125, -22.5, 0), (0, 0, 218.710740726))):
            Circle(SKETCH5_R_2)
    cut_extrude2_direction_2_tool2 = split(extrude(cut_extrude2_direction_2_sk2.sketch, amount=CUT_EXTRUDE2_DIRECTION_2_REACH, mode=Mode.PRIVATE), bisect_by=cut_extrude2_direction_2_end, keep=Keep.BOTH, mode=Mode.PRIVATE)
    # Sketch5 → Cut-Extrude2 direction 2 (cut, up to the picked face)
    with BuildSketch(Plane(origin=(0, 0, -14), x_dir=(-1, 0, 0), z_dir=(0, 0, -1)), mode=Mode.PRIVATE) as cut_extrude2_direction_2_sk3:
        with Locations(Location((9.0125, -22.5, 0), (0, 0, 321.289306711))):
            Circle(SKETCH5_R_2)
    cut_extrude2_direction_2_tool3 = split(extrude(cut_extrude2_direction_2_sk3.sketch, amount=CUT_EXTRUDE2_DIRECTION_2_REACH, mode=Mode.PRIVATE), bisect_by=cut_extrude2_direction_2_end, keep=Keep.BOTH, mode=Mode.PRIVATE)
    cut_extrude2_direction_2_1 = cut_extrude2_direction_2_tool1.solids().sort_by(Axis((0, -8, -14), (0, 0, -1)))[0]
    add(cut_extrude2_direction_2_1, mode=Mode.SUBTRACT)
    cut_extrude2_direction_2_2 = cut_extrude2_direction_2_tool2.solids().sort_by(Axis((9.0125, -22.5, -14), (0, 0, -1)))[0]
    add(cut_extrude2_direction_2_2, mode=Mode.SUBTRACT)
    cut_extrude2_direction_2_3 = cut_extrude2_direction_2_tool3.solids().sort_by(Axis((-9.0125, -22.5, -14), (0, 0, -1)))[0]
    add(cut_extrude2_direction_2_3, mode=Mode.SUBTRACT)
    cut_extrude2_direction_2 = cut_extrude2_direction_2_1 + cut_extrude2_direction_2_2 + cut_extrude2_direction_2_3  # Cut-Extrude2 direction 2 as one shape, for the pattern or mirror that repeats it

    # Mirror3: Boss-Extrude4, Boss-Extrude5, Cut-Extrude2, Cut-Extrude2 direction 2 across plane
    add(boss_extrude4.mirror(Plane.ZX.offset(13)))
    add(boss_extrude5.mirror(Plane.ZX.offset(13)))
    add(cut_extrude2.mirror(Plane.ZX.offset(13)), mode=Mode.SUBTRACT)
    add(cut_extrude2_direction_2.mirror(Plane.ZX.offset(13)), mode=Mode.SUBTRACT)


solid = part.part
